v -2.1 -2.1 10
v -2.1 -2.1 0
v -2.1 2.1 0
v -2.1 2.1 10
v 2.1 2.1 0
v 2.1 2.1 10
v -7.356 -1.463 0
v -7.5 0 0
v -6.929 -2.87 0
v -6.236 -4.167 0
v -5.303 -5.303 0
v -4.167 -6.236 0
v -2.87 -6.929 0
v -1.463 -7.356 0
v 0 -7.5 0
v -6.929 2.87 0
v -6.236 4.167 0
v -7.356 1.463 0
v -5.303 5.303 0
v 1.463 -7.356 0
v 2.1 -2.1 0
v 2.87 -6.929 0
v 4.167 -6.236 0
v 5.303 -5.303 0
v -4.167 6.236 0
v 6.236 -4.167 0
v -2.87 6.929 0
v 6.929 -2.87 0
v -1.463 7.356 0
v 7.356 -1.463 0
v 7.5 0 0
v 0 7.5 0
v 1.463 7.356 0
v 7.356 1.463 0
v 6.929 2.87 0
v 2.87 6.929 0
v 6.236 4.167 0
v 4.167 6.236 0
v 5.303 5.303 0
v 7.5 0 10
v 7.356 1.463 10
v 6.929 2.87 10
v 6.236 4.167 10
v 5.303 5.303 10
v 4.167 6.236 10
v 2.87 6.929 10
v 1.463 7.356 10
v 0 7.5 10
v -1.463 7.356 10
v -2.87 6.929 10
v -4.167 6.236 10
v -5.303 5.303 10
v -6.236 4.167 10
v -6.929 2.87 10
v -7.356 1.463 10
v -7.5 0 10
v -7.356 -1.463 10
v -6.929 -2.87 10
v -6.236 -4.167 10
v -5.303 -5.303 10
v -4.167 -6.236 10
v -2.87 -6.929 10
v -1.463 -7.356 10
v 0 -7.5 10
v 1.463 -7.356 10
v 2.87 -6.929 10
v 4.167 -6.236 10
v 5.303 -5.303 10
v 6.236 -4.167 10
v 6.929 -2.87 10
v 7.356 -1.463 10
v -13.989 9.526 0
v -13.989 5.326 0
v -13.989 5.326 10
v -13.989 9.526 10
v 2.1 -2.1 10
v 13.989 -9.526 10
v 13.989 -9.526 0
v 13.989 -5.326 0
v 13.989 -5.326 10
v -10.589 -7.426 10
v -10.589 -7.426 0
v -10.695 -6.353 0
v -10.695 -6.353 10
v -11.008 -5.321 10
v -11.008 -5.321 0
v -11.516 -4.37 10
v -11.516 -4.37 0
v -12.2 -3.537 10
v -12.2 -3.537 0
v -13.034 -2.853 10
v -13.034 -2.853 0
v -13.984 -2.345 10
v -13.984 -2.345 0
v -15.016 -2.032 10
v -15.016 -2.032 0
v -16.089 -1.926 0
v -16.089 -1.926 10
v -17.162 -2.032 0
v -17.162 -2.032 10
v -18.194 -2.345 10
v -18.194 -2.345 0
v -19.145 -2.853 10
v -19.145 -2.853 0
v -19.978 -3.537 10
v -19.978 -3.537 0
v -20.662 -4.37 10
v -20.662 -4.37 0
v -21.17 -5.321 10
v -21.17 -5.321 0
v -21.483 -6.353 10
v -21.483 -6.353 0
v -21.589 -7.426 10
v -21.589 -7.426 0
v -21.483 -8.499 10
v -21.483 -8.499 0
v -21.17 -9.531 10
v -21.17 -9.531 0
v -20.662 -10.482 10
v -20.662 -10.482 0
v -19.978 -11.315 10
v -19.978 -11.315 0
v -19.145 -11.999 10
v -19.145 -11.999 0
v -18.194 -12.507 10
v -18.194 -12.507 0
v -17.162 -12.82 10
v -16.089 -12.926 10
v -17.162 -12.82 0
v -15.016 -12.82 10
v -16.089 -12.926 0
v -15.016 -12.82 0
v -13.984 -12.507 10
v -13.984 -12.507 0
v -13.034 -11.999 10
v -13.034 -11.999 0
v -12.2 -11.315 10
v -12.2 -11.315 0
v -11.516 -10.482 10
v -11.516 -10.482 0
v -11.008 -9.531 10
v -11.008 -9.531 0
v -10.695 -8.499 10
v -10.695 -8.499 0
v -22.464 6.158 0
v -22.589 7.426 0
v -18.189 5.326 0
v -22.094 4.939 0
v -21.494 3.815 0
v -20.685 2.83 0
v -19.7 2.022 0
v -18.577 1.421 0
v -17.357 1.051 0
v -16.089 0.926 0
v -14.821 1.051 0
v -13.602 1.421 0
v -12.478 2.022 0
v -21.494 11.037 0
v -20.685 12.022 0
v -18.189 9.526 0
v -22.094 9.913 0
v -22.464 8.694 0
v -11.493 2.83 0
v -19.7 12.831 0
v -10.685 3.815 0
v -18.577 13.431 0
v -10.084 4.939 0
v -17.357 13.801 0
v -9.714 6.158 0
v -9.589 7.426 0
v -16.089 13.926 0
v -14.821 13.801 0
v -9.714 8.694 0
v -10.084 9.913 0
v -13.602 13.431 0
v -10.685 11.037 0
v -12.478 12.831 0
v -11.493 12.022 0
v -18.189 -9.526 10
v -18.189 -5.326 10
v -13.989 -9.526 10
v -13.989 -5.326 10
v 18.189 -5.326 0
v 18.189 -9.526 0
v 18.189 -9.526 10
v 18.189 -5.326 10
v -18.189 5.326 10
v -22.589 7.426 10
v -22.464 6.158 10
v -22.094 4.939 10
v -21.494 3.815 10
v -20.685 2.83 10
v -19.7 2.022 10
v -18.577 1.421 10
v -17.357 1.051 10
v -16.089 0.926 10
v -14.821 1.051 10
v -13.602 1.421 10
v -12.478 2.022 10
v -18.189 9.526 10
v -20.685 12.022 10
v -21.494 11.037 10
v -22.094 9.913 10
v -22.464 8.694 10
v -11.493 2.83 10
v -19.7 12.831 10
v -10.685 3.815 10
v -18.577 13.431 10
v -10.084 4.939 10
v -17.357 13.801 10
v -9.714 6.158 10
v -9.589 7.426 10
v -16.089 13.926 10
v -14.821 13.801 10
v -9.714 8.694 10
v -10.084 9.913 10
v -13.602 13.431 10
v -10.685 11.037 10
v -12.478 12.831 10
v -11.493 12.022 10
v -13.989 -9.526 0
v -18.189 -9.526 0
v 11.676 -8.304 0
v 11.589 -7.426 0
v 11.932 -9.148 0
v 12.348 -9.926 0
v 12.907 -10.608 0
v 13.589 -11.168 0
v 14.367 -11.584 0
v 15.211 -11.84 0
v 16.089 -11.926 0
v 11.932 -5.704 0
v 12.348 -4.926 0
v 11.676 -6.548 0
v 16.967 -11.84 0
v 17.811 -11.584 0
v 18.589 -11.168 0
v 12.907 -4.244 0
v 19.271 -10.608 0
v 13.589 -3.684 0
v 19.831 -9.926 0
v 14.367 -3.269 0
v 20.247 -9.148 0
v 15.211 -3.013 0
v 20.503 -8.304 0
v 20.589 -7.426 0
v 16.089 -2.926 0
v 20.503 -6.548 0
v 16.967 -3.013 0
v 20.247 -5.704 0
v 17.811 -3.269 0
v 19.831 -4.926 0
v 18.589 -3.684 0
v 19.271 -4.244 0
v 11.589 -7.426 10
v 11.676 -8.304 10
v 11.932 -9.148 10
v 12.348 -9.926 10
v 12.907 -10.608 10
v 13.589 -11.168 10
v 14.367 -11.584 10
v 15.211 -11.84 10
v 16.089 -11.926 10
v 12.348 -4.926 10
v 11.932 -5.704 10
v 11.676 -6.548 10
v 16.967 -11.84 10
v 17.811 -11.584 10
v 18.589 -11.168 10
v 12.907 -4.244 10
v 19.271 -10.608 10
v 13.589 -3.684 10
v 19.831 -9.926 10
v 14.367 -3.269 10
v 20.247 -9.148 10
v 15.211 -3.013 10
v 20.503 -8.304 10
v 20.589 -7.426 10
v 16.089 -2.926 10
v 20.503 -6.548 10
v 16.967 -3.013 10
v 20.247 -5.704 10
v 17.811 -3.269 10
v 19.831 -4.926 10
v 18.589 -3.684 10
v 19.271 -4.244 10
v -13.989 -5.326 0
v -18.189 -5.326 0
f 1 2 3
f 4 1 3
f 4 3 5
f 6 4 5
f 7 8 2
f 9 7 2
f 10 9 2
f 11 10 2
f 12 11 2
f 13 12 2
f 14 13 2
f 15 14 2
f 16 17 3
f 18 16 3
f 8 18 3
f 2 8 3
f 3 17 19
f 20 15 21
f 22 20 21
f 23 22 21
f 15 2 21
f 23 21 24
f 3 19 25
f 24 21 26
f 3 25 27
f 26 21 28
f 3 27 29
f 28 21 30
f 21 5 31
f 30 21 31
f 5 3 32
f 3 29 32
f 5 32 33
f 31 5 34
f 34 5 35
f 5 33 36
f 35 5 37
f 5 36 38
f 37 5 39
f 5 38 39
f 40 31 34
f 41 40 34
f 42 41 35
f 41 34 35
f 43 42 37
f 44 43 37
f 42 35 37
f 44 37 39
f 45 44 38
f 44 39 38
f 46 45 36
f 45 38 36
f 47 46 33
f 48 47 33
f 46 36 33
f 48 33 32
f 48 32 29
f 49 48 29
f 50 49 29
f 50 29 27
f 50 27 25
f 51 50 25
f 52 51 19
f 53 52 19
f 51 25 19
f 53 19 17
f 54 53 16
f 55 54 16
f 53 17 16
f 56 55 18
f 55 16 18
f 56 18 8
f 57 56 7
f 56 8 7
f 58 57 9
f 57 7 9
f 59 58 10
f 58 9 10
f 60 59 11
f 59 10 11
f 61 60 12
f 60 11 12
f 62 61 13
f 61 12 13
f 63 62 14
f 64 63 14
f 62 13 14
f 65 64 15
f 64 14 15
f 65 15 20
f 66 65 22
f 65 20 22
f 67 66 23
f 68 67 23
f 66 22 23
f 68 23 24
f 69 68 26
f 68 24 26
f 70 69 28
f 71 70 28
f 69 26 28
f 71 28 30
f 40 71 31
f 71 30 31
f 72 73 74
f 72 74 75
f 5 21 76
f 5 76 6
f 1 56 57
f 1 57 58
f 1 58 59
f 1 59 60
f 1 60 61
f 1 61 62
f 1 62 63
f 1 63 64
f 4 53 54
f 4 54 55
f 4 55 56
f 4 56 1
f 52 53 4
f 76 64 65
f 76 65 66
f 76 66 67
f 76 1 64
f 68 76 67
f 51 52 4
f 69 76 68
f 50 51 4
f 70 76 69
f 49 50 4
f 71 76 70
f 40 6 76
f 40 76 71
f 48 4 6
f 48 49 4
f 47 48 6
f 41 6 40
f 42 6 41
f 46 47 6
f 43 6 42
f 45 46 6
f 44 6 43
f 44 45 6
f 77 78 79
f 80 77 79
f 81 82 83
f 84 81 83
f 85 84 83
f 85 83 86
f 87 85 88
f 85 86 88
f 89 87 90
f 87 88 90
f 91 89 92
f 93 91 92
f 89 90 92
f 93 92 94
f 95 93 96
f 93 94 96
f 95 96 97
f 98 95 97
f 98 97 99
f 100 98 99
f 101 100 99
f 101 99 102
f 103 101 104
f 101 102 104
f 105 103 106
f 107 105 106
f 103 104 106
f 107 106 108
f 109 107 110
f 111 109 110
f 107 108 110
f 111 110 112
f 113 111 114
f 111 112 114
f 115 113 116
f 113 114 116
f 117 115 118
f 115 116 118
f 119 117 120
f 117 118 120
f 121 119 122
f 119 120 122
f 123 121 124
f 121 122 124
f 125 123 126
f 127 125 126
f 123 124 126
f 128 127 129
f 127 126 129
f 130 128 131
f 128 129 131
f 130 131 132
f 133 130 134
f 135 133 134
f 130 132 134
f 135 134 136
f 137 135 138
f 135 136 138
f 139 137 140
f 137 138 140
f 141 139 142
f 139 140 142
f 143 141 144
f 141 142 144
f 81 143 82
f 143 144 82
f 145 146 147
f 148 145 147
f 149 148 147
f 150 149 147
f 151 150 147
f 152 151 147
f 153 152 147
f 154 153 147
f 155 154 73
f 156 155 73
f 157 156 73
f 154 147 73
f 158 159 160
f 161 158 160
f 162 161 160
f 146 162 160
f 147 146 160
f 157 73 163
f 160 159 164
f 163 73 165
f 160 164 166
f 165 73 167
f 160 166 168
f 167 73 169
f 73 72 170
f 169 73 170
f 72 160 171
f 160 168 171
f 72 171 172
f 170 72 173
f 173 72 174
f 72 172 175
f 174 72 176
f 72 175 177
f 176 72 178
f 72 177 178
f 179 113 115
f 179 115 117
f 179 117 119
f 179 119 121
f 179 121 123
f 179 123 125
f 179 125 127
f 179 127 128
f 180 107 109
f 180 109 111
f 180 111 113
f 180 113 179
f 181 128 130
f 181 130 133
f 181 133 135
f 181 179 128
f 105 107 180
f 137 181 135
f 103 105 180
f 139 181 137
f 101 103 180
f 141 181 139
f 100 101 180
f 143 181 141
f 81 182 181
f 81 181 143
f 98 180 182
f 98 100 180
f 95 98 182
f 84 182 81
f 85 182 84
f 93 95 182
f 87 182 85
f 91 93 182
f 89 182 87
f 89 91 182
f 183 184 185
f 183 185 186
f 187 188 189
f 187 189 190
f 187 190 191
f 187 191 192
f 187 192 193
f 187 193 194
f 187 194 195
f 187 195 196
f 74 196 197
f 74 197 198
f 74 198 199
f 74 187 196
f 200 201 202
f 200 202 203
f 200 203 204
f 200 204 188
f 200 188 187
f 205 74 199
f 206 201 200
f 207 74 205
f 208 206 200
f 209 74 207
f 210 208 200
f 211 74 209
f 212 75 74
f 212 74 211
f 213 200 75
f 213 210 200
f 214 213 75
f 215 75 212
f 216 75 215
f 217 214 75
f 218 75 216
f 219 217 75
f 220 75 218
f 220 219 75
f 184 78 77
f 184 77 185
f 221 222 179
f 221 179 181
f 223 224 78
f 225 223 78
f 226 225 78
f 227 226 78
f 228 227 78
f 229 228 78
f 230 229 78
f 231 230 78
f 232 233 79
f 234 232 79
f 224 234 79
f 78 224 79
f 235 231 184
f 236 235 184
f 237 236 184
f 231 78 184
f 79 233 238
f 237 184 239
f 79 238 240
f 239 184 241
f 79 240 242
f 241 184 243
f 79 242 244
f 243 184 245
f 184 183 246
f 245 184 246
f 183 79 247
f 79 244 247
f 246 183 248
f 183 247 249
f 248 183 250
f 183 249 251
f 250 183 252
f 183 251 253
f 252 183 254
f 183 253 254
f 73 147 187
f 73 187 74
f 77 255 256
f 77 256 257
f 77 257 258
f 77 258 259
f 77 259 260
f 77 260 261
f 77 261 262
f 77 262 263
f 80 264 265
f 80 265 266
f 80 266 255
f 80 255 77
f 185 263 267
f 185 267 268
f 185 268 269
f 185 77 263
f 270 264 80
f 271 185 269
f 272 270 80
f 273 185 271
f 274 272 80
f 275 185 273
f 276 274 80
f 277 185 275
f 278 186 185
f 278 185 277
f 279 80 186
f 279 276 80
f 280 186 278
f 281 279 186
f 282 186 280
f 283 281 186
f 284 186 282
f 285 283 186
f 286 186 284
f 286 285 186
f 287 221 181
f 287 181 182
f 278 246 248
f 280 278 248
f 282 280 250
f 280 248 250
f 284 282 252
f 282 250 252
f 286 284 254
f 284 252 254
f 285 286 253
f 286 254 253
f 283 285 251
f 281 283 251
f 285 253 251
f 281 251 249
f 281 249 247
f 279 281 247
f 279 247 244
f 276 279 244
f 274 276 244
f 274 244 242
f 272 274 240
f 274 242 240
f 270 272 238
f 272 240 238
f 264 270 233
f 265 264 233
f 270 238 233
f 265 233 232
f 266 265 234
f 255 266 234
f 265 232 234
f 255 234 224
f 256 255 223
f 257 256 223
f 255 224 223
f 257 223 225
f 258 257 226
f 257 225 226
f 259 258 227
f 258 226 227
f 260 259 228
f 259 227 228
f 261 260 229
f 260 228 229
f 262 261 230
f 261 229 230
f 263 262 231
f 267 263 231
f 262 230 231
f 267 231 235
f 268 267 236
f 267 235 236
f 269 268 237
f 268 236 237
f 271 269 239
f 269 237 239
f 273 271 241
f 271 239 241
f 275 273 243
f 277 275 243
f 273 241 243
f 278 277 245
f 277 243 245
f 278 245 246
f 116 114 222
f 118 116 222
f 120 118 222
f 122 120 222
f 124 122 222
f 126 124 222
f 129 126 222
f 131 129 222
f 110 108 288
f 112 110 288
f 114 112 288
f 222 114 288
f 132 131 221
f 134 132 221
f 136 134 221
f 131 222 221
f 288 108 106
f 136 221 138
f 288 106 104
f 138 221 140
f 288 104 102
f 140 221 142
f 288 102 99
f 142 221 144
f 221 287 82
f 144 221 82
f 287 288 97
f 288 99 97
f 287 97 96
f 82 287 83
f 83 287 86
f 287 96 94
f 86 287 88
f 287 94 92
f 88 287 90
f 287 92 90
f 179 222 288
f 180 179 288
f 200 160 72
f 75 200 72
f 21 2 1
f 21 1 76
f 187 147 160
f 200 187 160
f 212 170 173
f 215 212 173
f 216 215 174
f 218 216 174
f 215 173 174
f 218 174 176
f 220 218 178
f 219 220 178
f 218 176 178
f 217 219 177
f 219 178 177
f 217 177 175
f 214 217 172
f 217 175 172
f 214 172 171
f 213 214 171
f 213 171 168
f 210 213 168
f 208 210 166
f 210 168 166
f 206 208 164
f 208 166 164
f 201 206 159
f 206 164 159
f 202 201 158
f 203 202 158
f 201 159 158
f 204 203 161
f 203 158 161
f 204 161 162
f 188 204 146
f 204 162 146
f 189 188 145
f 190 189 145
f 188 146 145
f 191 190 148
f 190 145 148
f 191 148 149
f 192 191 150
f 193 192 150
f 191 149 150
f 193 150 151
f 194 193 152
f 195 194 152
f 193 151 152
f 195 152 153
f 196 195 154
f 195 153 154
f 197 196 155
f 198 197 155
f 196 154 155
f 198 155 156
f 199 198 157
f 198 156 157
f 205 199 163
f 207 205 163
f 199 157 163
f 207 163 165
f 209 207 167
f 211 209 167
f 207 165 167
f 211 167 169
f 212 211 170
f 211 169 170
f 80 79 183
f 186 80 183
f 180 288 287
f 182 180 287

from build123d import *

# Parameters (mm, degrees)
F0_R     = 6.5
F0_W     = 4.2
F0_H     = 4.2
F0_R_2   = 5.5
F0_R_3   = 7.5
F0_R_4   = 4.5
F1_DEPTH = 10


with BuildPart() as f1:
    # F0 (on Top) → F1 (new body)
    with BuildSketch(Plane.XY):
        with Locations((-16.089159, 7.426054)):
            Circle(F0_R)
        with Locations((-16.089159, 7.426054)):
            Rectangle(F0_W, F0_H, mode=Mode.SUBTRACT)
        with Locations((-16.089159, -7.426054)):
            Circle(F0_R_2)
        with Locations((-16.089159, -7.426054)):
            Rectangle(F0_W, F0_H, mode=Mode.SUBTRACT)
        Circle(F0_R_3)
        Rectangle(F0_W, F0_H, mode=Mode.SUBTRACT)
        with Locations((16.089159, -7.426054)):
            Circle(F0_R_4)
        with Locations((16.089159, -7.426054)):
            Rectangle(F0_W, F0_H, mode=Mode.SUBTRACT)
    extrude(amount=F1_DEPTH)


solid = f1.part
